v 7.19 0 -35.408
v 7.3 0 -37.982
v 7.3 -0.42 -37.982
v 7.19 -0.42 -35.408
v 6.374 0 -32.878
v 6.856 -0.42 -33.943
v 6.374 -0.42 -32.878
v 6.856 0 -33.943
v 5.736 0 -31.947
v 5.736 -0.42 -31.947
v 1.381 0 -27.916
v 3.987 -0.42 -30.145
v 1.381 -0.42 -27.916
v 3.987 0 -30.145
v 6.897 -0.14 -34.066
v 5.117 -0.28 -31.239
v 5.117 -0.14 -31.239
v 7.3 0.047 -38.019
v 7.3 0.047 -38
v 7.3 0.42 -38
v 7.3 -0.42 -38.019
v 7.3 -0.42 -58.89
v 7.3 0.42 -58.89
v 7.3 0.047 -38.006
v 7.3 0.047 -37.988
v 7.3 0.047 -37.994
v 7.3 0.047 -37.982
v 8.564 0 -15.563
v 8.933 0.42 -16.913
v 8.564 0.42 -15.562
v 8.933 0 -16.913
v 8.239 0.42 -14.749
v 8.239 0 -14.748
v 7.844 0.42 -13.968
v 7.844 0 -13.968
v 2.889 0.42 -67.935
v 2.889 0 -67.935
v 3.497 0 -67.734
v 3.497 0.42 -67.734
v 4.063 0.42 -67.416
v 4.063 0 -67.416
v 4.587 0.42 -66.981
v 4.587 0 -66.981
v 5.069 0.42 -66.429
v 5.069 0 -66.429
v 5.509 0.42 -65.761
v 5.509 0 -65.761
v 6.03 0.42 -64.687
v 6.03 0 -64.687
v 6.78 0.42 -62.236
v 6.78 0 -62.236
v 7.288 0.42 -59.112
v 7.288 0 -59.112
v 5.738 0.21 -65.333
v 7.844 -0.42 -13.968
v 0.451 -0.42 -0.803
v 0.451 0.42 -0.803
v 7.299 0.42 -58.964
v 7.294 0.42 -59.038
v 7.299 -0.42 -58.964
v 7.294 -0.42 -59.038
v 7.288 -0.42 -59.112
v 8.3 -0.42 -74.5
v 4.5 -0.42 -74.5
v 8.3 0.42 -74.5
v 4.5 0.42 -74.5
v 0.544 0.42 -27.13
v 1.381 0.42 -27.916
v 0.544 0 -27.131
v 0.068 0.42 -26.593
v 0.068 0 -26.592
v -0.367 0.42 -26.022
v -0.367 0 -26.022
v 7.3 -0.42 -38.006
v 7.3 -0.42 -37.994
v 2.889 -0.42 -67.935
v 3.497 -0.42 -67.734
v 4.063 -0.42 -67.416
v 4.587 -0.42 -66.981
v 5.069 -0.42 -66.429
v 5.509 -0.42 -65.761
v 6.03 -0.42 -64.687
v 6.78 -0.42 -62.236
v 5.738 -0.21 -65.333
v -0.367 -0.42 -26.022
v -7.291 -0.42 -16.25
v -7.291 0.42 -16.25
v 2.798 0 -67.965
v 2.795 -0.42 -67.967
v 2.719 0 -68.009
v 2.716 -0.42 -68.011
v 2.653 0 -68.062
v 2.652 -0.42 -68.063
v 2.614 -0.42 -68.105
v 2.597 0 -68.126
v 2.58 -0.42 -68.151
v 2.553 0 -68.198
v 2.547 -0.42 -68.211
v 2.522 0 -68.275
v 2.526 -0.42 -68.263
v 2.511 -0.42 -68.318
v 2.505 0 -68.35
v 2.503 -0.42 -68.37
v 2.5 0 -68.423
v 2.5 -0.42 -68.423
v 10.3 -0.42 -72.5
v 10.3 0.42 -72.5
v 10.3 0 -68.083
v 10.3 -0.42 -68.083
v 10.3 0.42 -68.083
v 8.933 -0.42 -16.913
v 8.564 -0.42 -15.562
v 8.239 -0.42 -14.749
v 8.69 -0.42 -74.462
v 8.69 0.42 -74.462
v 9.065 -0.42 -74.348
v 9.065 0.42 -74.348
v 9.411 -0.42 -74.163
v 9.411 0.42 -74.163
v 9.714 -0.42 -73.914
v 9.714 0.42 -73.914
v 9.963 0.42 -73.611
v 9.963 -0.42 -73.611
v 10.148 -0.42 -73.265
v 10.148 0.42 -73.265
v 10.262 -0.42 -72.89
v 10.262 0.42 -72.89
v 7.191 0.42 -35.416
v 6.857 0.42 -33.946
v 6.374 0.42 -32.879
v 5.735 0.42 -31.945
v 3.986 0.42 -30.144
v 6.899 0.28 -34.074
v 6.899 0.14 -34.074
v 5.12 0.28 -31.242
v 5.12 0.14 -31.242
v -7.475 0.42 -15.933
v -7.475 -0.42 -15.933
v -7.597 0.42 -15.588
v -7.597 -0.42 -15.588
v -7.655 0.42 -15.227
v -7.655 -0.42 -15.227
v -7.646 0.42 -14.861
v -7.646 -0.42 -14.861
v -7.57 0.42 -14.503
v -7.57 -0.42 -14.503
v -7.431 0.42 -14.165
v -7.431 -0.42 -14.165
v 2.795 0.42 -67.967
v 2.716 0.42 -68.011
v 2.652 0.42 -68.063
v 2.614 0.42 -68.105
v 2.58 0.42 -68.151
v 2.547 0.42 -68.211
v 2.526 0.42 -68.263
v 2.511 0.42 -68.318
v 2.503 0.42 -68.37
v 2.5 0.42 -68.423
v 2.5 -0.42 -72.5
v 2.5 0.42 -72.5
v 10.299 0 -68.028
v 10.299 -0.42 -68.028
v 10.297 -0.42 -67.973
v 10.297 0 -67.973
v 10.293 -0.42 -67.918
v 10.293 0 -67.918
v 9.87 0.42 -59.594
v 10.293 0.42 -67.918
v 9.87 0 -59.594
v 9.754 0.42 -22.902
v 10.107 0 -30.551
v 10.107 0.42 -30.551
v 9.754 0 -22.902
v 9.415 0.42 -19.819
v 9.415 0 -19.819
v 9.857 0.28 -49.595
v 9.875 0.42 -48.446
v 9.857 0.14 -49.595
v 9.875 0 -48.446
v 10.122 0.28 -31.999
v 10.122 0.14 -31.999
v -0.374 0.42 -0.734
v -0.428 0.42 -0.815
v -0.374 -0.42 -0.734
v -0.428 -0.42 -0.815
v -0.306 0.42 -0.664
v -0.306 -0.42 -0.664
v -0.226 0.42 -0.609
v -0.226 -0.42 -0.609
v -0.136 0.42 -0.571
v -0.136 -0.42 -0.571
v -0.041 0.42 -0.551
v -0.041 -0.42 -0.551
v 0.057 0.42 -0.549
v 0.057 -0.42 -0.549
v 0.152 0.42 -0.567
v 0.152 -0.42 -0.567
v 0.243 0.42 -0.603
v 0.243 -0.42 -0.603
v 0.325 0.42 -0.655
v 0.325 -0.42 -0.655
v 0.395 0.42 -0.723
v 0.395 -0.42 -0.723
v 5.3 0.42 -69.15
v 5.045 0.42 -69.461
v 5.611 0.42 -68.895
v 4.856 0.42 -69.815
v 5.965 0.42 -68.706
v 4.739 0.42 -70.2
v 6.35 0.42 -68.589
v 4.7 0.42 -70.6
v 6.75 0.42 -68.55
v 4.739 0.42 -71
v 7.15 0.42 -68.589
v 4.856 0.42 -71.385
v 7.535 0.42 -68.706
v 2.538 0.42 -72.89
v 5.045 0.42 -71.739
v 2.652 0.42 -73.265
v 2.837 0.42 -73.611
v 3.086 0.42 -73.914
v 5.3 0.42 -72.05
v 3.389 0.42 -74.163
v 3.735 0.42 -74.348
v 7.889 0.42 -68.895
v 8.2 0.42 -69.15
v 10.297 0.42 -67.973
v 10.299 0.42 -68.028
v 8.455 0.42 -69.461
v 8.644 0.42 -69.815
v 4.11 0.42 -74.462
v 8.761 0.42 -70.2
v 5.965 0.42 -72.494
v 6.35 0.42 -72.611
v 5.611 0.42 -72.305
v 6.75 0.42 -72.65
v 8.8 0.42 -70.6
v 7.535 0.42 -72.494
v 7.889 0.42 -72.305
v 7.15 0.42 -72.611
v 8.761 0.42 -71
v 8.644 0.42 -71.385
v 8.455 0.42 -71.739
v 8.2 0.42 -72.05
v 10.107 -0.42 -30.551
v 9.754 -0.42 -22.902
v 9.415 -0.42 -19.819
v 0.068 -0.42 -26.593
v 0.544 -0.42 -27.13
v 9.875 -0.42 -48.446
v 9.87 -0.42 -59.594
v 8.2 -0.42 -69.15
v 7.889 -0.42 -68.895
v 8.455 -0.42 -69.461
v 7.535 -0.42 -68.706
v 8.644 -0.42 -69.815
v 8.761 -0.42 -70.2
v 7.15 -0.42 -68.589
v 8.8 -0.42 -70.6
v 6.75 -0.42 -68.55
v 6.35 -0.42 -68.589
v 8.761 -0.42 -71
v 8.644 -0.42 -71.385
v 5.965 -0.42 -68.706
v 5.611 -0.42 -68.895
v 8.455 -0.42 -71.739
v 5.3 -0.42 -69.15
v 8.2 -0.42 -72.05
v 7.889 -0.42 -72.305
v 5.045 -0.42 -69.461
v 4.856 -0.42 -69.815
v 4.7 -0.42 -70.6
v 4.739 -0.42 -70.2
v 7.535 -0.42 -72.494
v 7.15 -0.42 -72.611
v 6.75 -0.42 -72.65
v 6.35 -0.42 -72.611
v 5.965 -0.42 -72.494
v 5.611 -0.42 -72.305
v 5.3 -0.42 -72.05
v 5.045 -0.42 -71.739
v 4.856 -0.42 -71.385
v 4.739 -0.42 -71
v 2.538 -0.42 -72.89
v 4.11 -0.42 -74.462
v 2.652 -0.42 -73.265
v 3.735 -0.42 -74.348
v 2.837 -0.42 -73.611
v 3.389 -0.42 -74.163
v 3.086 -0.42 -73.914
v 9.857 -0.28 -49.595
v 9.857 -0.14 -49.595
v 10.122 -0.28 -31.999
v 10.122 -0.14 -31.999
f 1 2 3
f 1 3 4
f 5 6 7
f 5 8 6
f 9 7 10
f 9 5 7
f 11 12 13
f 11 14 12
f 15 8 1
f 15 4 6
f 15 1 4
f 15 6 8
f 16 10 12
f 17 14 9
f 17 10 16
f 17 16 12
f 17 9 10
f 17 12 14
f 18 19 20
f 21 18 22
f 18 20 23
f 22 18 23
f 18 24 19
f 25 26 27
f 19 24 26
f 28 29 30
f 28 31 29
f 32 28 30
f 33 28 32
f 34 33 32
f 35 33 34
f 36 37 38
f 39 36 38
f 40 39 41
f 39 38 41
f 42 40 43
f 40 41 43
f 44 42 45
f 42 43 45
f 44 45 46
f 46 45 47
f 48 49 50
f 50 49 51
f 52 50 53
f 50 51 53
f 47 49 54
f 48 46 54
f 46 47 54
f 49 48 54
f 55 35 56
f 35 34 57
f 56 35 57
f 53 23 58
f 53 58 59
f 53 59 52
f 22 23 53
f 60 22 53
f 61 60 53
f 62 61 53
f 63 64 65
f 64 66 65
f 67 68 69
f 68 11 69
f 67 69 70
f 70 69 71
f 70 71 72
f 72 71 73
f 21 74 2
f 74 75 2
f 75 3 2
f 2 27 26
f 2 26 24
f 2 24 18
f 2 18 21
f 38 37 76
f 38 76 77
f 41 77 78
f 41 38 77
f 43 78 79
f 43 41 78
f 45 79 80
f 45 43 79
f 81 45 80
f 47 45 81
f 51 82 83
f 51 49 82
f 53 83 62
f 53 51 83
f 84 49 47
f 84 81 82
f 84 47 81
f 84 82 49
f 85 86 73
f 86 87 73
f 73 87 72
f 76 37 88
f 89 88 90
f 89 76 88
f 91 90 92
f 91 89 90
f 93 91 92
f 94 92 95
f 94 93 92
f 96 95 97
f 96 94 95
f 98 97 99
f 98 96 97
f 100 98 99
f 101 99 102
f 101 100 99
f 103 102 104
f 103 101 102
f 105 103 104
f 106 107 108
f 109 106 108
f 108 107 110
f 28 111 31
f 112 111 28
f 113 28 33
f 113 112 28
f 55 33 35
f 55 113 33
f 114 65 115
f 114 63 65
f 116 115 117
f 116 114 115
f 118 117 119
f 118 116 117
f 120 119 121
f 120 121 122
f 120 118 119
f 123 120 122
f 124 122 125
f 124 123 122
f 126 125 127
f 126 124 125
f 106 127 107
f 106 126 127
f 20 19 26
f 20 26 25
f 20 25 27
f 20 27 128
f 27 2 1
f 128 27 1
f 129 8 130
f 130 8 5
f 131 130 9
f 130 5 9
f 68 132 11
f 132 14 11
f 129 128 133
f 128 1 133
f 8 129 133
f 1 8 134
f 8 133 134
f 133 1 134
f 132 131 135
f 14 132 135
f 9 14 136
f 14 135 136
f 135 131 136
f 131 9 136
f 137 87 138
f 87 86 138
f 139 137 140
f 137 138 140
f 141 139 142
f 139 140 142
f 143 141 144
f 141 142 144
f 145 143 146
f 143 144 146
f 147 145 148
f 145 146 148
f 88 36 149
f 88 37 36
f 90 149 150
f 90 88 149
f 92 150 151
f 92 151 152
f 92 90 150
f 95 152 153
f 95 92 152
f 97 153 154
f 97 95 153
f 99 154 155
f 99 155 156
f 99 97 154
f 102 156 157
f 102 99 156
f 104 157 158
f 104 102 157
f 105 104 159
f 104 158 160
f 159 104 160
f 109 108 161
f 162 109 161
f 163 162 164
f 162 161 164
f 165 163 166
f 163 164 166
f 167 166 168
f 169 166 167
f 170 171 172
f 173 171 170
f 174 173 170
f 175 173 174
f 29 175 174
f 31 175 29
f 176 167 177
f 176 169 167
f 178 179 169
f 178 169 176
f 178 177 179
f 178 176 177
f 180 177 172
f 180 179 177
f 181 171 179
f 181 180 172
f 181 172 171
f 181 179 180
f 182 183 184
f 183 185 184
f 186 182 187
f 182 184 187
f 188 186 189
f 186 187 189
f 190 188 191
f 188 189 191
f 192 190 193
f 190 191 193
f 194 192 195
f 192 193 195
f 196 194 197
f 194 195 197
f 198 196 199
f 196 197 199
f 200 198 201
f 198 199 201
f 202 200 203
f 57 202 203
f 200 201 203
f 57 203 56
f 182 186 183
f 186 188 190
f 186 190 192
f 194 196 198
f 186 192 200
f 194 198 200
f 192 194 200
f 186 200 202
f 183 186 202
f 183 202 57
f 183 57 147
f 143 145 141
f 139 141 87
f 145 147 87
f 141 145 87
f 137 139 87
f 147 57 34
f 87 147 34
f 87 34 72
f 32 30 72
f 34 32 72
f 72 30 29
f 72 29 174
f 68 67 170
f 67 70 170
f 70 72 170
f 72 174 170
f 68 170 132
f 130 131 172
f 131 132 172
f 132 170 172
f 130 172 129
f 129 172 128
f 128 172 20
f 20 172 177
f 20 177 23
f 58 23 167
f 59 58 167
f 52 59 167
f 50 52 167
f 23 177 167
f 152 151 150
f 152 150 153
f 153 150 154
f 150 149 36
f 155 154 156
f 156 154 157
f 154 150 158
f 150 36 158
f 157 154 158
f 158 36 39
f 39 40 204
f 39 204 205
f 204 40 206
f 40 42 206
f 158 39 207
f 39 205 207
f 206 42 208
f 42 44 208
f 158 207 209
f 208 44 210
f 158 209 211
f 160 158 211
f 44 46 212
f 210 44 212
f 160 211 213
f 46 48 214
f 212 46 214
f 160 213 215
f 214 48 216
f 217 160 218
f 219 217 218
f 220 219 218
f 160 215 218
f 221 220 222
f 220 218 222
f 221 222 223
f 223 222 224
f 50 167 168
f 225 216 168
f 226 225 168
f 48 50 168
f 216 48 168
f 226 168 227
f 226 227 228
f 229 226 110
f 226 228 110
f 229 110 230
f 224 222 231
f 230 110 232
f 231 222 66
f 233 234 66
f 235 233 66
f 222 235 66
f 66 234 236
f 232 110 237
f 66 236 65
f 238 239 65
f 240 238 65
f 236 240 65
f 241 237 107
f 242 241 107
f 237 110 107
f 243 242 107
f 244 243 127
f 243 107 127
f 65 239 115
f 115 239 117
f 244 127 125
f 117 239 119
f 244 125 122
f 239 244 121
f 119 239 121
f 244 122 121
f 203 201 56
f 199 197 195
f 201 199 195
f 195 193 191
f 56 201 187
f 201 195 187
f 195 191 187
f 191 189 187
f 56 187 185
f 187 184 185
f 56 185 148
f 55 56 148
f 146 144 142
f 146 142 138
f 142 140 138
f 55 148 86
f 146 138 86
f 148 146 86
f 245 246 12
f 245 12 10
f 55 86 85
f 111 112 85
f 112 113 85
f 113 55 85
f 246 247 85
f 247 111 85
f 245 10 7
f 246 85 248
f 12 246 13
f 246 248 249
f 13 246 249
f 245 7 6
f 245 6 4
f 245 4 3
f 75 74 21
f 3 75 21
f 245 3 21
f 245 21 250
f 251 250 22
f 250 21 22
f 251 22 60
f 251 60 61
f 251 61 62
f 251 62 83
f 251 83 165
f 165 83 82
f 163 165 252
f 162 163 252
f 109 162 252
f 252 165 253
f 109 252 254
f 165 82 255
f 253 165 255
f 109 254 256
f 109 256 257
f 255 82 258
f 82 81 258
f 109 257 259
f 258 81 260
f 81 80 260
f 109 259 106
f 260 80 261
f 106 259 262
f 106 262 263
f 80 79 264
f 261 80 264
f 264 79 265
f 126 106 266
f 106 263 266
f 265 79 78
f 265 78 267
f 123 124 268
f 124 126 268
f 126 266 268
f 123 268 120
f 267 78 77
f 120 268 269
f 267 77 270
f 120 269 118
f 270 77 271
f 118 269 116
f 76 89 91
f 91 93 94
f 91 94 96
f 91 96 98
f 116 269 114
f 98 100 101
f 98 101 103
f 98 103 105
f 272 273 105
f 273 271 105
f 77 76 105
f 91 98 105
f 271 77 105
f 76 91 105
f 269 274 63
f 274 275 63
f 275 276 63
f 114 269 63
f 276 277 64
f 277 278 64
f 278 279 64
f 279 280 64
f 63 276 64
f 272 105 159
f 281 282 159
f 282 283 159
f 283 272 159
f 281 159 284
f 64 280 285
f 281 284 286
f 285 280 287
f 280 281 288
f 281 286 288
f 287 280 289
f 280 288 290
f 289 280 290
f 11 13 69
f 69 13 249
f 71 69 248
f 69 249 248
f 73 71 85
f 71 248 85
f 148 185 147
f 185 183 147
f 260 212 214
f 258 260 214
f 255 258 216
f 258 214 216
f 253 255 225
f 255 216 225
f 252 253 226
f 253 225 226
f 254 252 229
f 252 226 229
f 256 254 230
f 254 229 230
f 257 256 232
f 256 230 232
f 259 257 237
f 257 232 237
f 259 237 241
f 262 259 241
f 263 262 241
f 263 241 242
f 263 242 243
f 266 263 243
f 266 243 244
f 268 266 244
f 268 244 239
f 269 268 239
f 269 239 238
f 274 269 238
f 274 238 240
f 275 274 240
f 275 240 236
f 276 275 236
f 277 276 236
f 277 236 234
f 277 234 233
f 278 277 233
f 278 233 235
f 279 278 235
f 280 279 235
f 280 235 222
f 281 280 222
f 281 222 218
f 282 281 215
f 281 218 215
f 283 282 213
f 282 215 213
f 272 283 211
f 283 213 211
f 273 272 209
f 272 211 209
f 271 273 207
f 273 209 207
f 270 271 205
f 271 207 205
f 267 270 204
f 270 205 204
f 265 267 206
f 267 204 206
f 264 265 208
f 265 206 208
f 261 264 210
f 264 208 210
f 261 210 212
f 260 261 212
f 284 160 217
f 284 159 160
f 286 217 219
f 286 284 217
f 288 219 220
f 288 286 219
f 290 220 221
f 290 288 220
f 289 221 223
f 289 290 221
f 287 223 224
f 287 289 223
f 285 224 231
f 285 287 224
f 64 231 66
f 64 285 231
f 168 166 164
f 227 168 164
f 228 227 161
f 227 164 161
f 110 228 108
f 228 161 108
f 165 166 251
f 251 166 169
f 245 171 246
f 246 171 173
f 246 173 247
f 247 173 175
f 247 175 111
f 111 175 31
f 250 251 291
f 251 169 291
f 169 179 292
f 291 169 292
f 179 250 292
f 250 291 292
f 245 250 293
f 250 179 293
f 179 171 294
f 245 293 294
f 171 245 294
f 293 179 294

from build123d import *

# Parameters (mm, degrees)
BOSS_EXTRUDE1_DEPTH = 0.42
SKETCH2_R           = 2.05
CUT_EXTRUDE1_DEPTH  = 76.213334038
FILLET1_R           = 10
FILLET2_R           = 0.5
FILLET3_R           = 2
FILLET4_R           = 2
FILLET5_R           = 0.5
FILLET6_R           = 2


with BuildPart() as part:
    # Sketch1 → Boss-Extrude1 (new, symmetric)
    with BuildSketch(Plane(origin=(0, 0, 0), x_dir=(1, 0, 0), z_dir=(0, 1, 0))):
        with BuildLine():
            Line((2.5, 68), (2.5, 74.5))
            Line((2.5, 74.5), (10.3, 74.5))
            Line((10.3, 74.5), (10.3, 68))
            add(Edge.make_bspline(
                [(10.3, 68), (8.714398617, 49.11082539), (11.816891749, 28.482557039), (8.564530207, 15.25)],
                knots=[0, 0, 0, 0, 1, 1, 1, 1], degree=3))
            Line((8.564530207, 15.25), (0, 0))
            Line((0, 0), (-8, 15.25))
            Line((-8, 15.25), (0.382846681, 27.081224853))
            add(Edge.make_bspline(
                [(7.3, 38), (7.400709228, 32.674514217), (6.147076675, 31.910033807), (0.382846681, 27.081224853)],
                knots=[0, 0, 0, 0, 1, 1, 1, 1], degree=3))
            Line((7.3, 38), (7.3, 59))
            add(Edge.make_bspline(
                [(2.5, 68), (6.364741582, 67.576851124), (7.3, 59)],
                knots=[0, 0, 0, 1, 1, 1], degree=2))
        make_face()
    extrude(amount=BOSS_EXTRUDE1_DEPTH, both=True)

    # Sketch2 → Cut-Extrude1 (cut, through all)
    with BuildSketch(Plane(origin=(0, 0.42, 0), x_dir=(1, 0, 0), z_dir=(0, 1, 0))):
        with Locations(Location((6.75, 70.6, 0), (0, 0, 270))):
            Circle(SKETCH2_R)
    extrude(amount=-CUT_EXTRUDE1_DEPTH, mode=Mode.SUBTRACT)

    # Fillet1
    fillet1_edges = [part.edges().sort_by_distance(p)[0] for p in [
        (8.564530207, -0.21, -15.25),
        (0.382846681, -0.21, -27.081224853),
    ]]
    fillet(fillet1_edges, radius=FILLET1_R)

    # Fillet2
    fillet2_edges = [part.edges().sort_by_distance(p)[0] for p in [
        (2.5, -0.21, -68),
    ]]
    fillet(fillet2_edges, radius=FILLET2_R)

    # Fillet3
    fillet3_edges = [part.edges().sort_by_distance(p)[0] for p in [
        (2.5, 0, -74.5),
        (10.3, 0, -74.5),
    ]]
    fillet(fillet3_edges, radius=FILLET3_R)

    # Fillet4
    fillet4_edges = [part.edges().sort_by_distance(p)[0] for p in [
        (-8, 0, -15.25),
    ]]
    fillet(fillet4_edges, radius=FILLET4_R)

    # Fillet5
    fillet5_edges = [part.edges().sort_by_distance(p)[0] for p in [
        (0, 0, 0),
    ]]
    fillet(fillet5_edges, radius=FILLET5_R)

    # Fillet6
    # the kernel refuses this fillet: 2 mm, written as the material it adds along each edge
    with BuildSketch(Plane(origin=(7.3, 0, -59), x_dir=(0, 0, 1), z_dir=(0, -1, 0))) as fillet6_piece_1:
        with BuildLine():
            CenterArc((0.110157954, 2), FILLET6_R, 263.610060097, 6.389939903)
            ThreePointArc((-0.112430932, 0.012425048), (-0.056219986, 0.006171626), (0, 0))
            Line((0, 0), (0.110157954, 0))
        make_face()
    extrude(amount=0.42)
    with BuildSketch(Plane(origin=(7.3, 0, -59), x_dir=(0, 0, 1), z_dir=(0, 1, 0))) as fillet6_piece_2:
        with BuildLine():
            CenterArc((0.110157954, -2), FILLET6_R, 90, 6.389939903)
            ThreePointArc((-0.112430932, -0.012425048), (-0.056219986, -0.006171626), (0, 0))
            Line((0, 0), (0.110157954, 0))
        make_face()
    extrude(amount=0.42)
    # the kernel refuses this fillet: 2 mm, written as the material it takes off along each edge
    with BuildSketch(Plane(origin=(7.3, 0.046586814, -38), x_dir=(0, 0, -1), z_dir=(0, -1, 0))) as fillet6_2_piece_1:
        with BuildLine():
            CenterArc((0.018634726, 2), FILLET6_R, 268.947653116, 1.052346884)
            ThreePointArc((-0.018097045, 0.000337334), (-0.0090485, 0.000169892), (0, 0))
            Line((0, 0), (0.018634726, 0))
        make_face()
    extrude(amount=0.513173628, mode=Mode.SUBTRACT)
    with BuildSketch(Plane(origin=(10.3, 0, -68), x_dir=(-0.08328041944419425, 0, 0.9965261520588404), z_dir=(0, -1, 0))) as fillet6_2_piece_2:
        with BuildLine():
            CenterArc((0.083426948, 1.999999864), FILLET6_R, 265.222850471, 4.756036045)
            Line((-0.083133891, 0.00694756), (0, 0))
            ThreePointArc((0, 0), (0.041344974, 7.623e-06), (0.082689948, 0))
        make_face()
    extrude(amount=0.628559231, mode=Mode.SUBTRACT)
    with BuildSketch(Plane(origin=(10.3, 0, -68), x_dir=(-0.08328041944419425, 0, 0.9965261520588404), z_dir=(0, 1, 0))) as fillet6_2_piece_3:
        with BuildLine():
            CenterArc((0.083426948, -1.999999864), FILLET6_R, 90.021113485, 4.756036045)
            Line((-0.083133891, -0.00694756), (0, 0))
            ThreePointArc((0, 0), (0.041344974, -7.623e-06), (0.082689948, 0))
        make_face()
    extrude(amount=0.628559231, mode=Mode.SUBTRACT)


solid = part.part
